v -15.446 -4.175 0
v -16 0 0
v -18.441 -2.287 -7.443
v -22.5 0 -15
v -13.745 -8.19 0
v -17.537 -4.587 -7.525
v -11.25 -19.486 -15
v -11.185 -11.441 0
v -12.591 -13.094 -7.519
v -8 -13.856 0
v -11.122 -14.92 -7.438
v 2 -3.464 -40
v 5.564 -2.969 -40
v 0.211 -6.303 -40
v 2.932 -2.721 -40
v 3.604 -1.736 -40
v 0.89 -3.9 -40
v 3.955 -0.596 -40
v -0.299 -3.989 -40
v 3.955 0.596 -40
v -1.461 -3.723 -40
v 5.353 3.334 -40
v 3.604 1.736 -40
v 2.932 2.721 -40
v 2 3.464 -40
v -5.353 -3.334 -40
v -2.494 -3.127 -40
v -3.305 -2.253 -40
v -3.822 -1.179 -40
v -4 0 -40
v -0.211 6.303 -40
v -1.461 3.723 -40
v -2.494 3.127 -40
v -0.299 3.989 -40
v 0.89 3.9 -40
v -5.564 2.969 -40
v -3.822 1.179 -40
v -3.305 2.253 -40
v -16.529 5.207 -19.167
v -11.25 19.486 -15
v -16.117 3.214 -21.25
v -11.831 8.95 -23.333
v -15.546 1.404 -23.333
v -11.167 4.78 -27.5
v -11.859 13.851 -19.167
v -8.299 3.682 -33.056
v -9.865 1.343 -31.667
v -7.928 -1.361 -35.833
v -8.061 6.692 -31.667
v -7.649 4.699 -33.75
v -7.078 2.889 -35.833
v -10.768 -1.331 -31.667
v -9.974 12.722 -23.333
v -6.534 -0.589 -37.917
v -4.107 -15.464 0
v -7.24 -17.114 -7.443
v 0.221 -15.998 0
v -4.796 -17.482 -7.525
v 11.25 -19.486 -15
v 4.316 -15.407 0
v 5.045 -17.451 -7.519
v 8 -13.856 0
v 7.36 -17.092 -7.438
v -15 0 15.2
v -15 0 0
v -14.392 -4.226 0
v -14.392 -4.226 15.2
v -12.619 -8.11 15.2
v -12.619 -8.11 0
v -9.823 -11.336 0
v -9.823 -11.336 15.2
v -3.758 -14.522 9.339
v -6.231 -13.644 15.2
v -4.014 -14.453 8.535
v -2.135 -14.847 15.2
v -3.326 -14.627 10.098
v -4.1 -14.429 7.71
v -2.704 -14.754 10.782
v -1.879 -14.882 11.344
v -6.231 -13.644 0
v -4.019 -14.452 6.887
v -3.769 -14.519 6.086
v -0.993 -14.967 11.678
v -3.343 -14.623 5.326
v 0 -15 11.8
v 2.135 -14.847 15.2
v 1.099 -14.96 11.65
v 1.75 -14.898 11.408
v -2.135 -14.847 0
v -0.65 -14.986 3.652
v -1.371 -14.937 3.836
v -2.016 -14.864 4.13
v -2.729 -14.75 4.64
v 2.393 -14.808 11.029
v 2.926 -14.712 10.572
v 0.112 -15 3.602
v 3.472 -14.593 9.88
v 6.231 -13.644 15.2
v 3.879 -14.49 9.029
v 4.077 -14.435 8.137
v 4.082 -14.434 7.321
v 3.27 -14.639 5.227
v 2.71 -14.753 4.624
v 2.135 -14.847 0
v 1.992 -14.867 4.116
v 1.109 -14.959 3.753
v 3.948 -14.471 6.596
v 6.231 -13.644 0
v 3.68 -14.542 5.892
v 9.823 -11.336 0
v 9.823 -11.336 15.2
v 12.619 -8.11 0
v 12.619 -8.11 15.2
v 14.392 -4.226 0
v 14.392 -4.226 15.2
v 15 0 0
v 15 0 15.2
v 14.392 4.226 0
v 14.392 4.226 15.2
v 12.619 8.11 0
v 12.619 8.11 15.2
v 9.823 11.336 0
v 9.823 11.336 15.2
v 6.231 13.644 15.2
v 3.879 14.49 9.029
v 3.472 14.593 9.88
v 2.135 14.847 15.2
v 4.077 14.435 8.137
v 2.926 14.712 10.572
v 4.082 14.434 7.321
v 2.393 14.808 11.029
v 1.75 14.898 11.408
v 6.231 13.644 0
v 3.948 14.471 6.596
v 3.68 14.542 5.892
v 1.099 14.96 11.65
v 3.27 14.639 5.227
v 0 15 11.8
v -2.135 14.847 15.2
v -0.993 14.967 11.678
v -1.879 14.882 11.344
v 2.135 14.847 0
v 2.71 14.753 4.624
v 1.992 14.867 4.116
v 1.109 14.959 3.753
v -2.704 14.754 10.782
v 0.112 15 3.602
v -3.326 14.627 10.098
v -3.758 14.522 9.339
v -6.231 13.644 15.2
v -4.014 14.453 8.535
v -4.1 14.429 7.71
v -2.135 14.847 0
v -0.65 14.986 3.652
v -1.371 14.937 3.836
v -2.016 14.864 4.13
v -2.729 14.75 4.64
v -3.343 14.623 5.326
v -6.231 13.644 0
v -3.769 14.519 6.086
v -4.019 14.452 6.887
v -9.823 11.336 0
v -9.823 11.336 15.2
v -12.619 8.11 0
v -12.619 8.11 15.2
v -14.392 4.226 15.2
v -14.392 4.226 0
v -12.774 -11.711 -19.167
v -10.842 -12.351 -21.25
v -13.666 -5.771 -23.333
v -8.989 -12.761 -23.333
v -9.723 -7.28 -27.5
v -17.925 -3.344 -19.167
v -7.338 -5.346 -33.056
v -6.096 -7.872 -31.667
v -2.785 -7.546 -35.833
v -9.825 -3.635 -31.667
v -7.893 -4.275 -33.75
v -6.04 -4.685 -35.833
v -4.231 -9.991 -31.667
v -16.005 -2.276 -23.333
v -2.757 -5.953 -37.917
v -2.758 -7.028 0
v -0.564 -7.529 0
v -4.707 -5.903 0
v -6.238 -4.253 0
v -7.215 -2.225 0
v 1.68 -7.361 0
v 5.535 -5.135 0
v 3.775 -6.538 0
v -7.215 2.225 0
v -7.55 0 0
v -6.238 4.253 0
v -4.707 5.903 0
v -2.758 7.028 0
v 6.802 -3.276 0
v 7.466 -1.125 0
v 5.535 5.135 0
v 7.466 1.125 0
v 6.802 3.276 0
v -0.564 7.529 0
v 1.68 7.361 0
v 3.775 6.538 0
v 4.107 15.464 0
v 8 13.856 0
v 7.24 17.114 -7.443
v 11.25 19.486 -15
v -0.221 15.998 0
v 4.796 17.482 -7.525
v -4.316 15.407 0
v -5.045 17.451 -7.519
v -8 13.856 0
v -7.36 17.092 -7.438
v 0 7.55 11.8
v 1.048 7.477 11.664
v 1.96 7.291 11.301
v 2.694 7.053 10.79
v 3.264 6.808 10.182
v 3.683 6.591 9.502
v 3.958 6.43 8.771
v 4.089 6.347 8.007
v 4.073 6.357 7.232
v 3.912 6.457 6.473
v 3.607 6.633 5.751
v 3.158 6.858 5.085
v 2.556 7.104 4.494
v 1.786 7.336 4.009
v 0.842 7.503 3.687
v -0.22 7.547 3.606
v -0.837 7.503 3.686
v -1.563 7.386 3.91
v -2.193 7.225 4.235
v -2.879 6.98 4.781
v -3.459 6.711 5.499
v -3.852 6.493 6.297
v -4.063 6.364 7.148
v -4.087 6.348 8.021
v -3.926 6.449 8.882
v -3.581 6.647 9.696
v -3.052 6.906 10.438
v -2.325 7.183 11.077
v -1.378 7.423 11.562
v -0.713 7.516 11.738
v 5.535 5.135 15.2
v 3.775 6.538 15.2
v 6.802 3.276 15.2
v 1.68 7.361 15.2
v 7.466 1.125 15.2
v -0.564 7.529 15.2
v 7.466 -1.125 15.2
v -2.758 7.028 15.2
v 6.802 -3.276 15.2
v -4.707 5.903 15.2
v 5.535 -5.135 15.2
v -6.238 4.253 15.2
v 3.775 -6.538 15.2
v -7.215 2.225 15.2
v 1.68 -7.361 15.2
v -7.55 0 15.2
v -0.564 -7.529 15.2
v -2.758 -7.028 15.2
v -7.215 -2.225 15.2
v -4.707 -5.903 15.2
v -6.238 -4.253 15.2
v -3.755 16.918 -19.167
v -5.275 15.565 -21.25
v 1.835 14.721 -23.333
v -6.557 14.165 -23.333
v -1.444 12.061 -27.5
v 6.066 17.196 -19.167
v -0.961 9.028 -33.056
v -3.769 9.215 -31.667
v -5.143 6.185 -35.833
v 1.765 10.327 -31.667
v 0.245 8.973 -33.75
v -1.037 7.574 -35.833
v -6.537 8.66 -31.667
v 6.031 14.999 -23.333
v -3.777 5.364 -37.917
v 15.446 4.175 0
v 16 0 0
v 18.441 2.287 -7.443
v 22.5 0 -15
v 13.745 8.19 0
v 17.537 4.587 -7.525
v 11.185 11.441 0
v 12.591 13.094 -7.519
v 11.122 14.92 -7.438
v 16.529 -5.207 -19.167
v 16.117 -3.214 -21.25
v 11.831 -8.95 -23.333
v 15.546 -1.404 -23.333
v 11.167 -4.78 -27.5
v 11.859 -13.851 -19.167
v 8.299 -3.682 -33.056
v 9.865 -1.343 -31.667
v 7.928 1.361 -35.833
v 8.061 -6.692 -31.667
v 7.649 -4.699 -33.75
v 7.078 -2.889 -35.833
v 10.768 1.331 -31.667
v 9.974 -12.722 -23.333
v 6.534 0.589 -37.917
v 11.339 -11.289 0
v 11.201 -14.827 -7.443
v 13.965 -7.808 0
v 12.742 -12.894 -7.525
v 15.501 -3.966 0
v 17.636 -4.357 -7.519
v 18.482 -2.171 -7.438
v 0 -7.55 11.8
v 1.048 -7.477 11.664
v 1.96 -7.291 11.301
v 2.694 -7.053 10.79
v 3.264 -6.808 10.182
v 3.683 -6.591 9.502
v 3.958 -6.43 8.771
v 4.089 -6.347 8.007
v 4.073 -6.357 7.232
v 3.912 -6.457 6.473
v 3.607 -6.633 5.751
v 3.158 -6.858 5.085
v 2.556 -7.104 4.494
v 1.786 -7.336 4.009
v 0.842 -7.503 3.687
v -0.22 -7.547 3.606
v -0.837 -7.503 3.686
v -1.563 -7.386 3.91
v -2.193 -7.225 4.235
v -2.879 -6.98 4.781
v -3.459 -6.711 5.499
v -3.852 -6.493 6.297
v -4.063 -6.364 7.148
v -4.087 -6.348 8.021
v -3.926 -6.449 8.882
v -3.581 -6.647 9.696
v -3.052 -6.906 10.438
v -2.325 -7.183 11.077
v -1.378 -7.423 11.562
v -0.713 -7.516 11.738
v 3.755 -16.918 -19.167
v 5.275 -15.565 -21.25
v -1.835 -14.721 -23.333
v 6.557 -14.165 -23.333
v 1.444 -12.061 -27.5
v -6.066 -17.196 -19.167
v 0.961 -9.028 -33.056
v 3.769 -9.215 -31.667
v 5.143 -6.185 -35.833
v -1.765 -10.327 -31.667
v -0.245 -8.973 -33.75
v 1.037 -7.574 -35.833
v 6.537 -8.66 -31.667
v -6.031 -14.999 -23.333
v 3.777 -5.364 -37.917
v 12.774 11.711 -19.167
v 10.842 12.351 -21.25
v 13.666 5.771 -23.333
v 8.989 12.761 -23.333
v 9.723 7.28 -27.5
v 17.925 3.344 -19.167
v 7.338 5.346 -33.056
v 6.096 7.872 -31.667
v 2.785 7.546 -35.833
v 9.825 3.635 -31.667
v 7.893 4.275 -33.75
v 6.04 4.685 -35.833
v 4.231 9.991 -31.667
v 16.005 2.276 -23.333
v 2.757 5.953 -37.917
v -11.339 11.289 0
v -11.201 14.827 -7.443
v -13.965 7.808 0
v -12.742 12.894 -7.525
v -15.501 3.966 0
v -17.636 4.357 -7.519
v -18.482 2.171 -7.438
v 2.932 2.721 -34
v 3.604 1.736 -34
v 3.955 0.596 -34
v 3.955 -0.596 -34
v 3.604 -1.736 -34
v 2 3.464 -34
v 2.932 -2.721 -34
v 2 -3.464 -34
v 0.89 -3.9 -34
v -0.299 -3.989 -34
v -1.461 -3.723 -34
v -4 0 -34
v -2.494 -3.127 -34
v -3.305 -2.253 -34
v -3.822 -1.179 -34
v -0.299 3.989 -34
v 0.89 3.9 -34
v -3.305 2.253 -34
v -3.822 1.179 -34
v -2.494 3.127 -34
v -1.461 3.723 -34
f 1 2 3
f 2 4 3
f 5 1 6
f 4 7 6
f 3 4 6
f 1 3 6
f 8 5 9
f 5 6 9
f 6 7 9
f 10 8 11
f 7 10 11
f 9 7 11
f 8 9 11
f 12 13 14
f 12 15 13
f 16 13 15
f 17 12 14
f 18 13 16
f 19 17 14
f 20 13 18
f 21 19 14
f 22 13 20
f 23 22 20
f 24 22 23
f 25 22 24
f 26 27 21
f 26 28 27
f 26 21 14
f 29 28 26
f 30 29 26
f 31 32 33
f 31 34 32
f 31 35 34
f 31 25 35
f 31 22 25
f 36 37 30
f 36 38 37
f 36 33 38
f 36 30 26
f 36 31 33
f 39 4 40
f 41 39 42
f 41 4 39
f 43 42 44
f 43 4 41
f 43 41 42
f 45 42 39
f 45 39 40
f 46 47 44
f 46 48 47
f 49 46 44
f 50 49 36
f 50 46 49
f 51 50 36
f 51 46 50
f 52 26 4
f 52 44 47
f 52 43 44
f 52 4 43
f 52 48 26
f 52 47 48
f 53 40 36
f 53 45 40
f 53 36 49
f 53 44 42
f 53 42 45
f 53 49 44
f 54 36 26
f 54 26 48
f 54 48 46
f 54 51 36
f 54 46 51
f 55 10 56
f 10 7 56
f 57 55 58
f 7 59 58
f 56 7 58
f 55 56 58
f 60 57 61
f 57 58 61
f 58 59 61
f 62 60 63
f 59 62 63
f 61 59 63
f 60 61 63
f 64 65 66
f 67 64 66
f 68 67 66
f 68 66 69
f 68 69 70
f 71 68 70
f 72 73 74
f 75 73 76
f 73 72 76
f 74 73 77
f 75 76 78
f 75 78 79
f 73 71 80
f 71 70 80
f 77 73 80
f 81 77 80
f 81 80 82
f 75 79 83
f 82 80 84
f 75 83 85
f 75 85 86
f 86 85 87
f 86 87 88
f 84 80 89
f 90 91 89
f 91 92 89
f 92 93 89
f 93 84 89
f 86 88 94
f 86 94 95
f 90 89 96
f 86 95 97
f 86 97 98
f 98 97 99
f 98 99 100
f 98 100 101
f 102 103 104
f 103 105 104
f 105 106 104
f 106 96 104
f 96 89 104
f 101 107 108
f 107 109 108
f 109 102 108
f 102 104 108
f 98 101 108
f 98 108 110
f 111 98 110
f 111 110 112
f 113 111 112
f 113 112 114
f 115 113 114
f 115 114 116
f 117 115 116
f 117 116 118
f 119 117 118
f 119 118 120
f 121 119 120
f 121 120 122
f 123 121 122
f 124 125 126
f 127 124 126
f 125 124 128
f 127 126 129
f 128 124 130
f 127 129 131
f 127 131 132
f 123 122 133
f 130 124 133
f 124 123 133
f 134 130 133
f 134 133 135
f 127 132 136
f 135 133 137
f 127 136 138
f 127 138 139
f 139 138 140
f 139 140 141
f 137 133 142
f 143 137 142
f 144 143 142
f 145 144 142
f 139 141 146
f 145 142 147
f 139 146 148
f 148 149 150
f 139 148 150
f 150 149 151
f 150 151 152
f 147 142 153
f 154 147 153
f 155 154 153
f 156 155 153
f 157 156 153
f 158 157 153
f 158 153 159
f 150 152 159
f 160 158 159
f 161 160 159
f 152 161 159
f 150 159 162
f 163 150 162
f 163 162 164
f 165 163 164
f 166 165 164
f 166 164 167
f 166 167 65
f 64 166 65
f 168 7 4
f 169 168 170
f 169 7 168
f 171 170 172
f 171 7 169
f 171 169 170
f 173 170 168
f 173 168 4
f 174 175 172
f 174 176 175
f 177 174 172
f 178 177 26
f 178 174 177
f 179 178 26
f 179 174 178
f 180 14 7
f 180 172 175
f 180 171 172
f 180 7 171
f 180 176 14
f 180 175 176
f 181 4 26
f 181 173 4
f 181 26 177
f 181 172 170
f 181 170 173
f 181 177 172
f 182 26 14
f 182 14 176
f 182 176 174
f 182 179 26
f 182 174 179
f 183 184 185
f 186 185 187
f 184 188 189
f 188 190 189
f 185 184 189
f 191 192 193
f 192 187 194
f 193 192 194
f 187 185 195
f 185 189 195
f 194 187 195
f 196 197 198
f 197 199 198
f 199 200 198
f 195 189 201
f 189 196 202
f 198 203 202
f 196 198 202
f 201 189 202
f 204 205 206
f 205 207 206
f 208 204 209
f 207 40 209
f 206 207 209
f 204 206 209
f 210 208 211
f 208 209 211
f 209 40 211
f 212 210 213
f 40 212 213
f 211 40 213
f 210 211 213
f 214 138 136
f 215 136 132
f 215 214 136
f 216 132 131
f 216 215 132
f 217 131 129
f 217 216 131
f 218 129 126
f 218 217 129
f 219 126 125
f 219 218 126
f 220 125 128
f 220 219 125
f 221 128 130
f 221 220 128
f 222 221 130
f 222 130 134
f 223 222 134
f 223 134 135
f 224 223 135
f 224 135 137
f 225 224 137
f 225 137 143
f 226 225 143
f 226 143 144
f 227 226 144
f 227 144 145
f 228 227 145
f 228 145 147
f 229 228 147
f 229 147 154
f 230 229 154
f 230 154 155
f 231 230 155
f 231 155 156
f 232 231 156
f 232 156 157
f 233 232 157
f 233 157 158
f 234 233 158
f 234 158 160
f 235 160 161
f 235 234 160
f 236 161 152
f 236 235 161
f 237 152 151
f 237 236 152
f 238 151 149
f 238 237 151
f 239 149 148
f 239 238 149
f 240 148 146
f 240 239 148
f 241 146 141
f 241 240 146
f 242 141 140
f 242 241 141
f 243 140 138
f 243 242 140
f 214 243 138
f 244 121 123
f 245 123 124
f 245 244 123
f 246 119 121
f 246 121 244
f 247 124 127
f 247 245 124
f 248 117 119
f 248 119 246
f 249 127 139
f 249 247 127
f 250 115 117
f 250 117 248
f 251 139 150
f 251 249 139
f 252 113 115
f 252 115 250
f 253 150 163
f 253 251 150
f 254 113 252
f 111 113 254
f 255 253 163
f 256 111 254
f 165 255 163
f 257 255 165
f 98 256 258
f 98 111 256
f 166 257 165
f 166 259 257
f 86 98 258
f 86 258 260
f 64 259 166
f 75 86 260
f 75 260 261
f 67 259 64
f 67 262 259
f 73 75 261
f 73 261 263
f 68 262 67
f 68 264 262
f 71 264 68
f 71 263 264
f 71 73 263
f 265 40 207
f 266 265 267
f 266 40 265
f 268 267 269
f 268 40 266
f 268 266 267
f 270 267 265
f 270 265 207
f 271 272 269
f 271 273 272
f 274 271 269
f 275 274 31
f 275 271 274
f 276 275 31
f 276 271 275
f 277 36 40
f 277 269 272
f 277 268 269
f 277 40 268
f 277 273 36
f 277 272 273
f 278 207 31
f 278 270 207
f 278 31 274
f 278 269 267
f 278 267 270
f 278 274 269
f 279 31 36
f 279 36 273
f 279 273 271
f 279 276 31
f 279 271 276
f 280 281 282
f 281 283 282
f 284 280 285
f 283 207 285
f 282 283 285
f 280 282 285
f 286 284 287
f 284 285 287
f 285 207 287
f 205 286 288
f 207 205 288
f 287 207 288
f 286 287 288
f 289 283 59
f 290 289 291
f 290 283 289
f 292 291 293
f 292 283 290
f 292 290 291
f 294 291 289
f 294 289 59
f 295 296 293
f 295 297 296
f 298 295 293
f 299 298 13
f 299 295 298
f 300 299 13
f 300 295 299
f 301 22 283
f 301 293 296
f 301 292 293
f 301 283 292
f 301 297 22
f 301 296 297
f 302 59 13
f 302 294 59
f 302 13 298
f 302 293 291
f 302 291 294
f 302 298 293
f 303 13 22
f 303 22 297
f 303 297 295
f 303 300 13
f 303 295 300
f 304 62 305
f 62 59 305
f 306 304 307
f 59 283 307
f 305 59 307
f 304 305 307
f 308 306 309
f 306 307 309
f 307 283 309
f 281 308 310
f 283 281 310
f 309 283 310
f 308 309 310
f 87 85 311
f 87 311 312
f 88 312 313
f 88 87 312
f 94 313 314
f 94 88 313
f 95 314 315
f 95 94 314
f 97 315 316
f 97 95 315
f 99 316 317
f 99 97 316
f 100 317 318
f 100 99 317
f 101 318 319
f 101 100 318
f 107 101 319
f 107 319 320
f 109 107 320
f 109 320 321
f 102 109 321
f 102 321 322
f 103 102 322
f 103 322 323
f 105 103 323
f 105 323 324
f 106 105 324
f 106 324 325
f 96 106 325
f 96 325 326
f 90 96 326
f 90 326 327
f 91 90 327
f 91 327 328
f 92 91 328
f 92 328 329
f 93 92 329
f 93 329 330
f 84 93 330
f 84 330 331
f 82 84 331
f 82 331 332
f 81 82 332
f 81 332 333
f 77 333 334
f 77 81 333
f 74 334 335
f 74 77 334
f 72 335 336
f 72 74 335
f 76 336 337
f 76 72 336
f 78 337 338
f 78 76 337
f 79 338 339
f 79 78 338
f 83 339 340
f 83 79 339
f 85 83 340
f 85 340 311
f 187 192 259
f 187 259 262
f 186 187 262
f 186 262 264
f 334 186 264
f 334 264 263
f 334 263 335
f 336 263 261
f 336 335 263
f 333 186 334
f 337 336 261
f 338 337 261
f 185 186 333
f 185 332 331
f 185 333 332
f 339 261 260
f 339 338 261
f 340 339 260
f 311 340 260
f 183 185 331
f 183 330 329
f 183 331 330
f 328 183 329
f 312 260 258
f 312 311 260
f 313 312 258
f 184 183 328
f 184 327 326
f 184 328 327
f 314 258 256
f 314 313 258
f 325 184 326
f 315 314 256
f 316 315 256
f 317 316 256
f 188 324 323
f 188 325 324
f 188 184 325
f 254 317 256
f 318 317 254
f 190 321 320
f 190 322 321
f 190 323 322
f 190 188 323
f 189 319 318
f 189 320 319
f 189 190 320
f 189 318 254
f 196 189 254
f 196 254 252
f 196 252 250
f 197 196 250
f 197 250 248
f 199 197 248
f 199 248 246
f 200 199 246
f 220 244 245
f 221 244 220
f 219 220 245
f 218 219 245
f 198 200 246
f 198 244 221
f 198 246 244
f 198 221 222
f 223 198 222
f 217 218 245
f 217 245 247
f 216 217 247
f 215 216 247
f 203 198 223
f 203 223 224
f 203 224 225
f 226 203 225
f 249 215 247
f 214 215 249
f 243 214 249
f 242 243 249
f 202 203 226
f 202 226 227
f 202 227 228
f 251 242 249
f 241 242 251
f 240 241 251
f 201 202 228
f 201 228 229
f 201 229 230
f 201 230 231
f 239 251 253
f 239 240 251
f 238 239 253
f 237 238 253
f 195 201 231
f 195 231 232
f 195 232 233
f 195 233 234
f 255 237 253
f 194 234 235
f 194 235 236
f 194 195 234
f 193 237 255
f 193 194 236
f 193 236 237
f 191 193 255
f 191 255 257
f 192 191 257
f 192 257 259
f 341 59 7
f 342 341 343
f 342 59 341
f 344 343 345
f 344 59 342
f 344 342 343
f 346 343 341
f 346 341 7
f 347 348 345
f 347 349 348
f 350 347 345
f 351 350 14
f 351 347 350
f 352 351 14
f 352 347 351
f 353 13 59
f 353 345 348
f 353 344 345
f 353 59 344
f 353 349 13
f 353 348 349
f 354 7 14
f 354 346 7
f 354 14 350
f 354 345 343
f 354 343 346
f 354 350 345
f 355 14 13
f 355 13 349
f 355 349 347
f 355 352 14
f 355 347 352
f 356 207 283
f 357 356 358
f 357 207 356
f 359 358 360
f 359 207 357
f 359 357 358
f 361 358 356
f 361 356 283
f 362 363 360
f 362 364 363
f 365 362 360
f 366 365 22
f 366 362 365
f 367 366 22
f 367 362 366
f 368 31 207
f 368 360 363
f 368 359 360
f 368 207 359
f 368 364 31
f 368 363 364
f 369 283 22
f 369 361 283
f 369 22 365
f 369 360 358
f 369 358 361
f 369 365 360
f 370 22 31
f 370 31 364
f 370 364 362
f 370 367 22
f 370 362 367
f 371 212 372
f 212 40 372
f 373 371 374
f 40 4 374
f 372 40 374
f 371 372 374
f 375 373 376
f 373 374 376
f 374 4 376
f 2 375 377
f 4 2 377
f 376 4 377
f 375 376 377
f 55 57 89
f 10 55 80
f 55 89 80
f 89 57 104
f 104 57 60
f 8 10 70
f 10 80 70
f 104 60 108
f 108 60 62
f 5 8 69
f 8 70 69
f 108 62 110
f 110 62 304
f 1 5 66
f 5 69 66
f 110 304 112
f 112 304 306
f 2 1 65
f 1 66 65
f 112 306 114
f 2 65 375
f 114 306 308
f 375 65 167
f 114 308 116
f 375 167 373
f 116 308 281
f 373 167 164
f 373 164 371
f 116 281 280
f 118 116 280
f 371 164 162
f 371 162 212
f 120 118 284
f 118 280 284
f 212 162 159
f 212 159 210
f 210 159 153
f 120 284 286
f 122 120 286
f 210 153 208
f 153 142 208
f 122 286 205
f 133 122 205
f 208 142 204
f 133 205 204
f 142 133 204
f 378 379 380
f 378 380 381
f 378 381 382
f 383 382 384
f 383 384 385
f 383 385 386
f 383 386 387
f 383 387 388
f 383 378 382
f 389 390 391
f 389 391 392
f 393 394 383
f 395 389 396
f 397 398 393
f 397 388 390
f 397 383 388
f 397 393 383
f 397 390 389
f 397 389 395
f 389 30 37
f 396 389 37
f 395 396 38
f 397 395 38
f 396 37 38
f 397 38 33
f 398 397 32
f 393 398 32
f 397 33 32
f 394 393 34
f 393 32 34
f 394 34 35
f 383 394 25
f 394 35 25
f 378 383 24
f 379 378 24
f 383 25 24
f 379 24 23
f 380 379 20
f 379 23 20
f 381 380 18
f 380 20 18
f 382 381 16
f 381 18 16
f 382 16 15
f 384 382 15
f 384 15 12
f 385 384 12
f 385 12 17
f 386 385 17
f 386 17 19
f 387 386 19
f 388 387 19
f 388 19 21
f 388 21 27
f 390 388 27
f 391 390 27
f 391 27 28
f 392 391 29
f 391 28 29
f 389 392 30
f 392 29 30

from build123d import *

# Parameters (mm, degrees)
SKETCH_1_R               = 15
SKETCH_1_R_2             = 7.55
EXTRUDE_1_DEPTH          = 15.2
CUT_EXTRUDE_1_DEPTH      = 27.096743092
CUT_EXTRUDE_1_DEPTH_BACK = 27.096743092
SKETCH_2_R               = 4.1
SKETCH_8_R               = 4
CUT_EXTRUDE_2_DEPTH      = 6


with BuildPart() as part:
    # 스케치1 → 보스-돌출1 (new body)
    with BuildSketch(Plane.XY):
        with Locations(Location((0, 0, 0), (0, 0, 180))):
            Circle(SKETCH_1_R)
        with Locations(Location((0, 0, 0), (0, 0, 180))):
            Circle(SKETCH_1_R_2, mode=Mode.SUBTRACT)
    extrude(amount=EXTRUDE_1_DEPTH)

    # 스케치2 → 컷-돌출1 (cut, two sides: drawn at the far end of the back side and taken through both)
    with BuildSketch(Plane(origin=(0, 0, 0), x_dir=(1, 0, 0), z_dir=(0, 1, 0)).offset(-CUT_EXTRUDE_1_DEPTH_BACK)):
        with Locations(Location((0, -7.7, 0), (0, 0, 270))):
            Circle(SKETCH_2_R)
    extrude(amount=CUT_EXTRUDE_1_DEPTH + CUT_EXTRUDE_1_DEPTH_BACK, mode=Mode.SUBTRACT)

    # 스케치3 for 로프트4 → 로프트4 section 0
    with BuildSketch(Plane.XY):
        with BuildLine():
            # circular arc as an exact rational Bezier (weights 1, cos(half-angle), 1)
            Bezier((8, -13.856406461), (16.000000001, -9.237604308), (16, 0), weights=[1, 0.866025404, 1])
            Bezier((16, 0), (16.000000001, 9.237604308), (8, 13.856406461), weights=[1, 0.866025404, 1])
            Bezier((8, 13.856406461), (0, 18.475208613), (-8, 13.856406461), weights=[1, 0.866025404, 1])
            Bezier((-8, 13.856406461), (-16.000000001, 9.237604308), (-16, 0), weights=[1, 0.866025404, 1])
            Bezier((-16, 0), (-16.000000001, -9.237604308), (-8, -13.856406461), weights=[1, 0.866025404, 1])
            Bezier((-8, -13.856406461), (0, -18.475208613), (8, -13.856406461), weights=[1, 0.866025404, 1])
        make_face()
    # 스케치4 → 로프트4 section 1
    with BuildSketch(Plane.XY.offset(-15)):
        with BuildLine():
            Line((11.25, -19.485571585), (22.5, 0))
            Line((22.5, 0), (11.25, 19.485571585))
            Line((11.25, 19.485571585), (-11.25, 19.485571585))
            Line((-11.25, 19.485571585), (-22.5, 0))
            Line((-22.5, 0), (-11.25, -19.485571585))
            Line((-11.25, -19.485571585), (11.25, -19.485571585))
        make_face()
    loft()

    # 로프트5: read off the stored shape, not the designer's step
    # 로프트5: loft between two sections, ruled curve by curve
    loft_5_from = [
        Edge.make_bspline([(22.5, 0, -15), (20.625, -3.247595264, -15), (18.75, -6.495190528, -15), (15, -12.990381057, -15), (13.125, -16.237976321, -15), (11.25, -19.485571585, -15)], [0, 0, 0, 0, 0.5, 0.5, 1, 1, 1, 1], 3),
        Edge.make_bspline([(11.25, -19.485571585, -15), (7.5, -19.485571585, -15), (3.75, -19.485571585, -15), (-3.75, -19.485571585, -15), (-7.5, -19.485571585, -15), (-11.25, -19.485571585, -15)], [0, 0, 0, 0, 0.5, 0.5, 1, 1, 1, 1], 3),
        Edge.make_bspline([(11.25, 19.485571585, -15), (13.125, 16.237976321, -15), (15, 12.990381057, -15), (18.75, 6.495190528, -15), (20.625, 3.247595264, -15), (22.5, 0, -15)], [0, 0, 0, 0, 0.5, 0.5, 1, 1, 1, 1], 3),
        Edge.make_bspline([(-11.25, -19.485571585, -15), (-13.125, -16.237976321, -15), (-15, -12.990381057, -15), (-18.75, -6.495190528, -15), (-20.625, -3.247595264, -15), (-22.5, 0, -15)], [0, 0, 0, 0, 0.5, 0.5, 1, 1, 1, 1], 3),
        Edge.make_bspline([(-22.5, 0, -15), (-20.625, 3.247595264, -15), (-18.75, 6.495190528, -15), (-15, 12.990381057, -15), (-13.125, 16.237976321, -15), (-11.25, 19.485571585, -15)], [0, 0, 0, 0, 0.5, 0.5, 1, 1, 1, 1], 3),
        Edge.make_bspline([(-11.25, 19.485571585, -15), (-7.5, 19.485571585, -15), (-3.75, 19.485571585, -15), (3.75, 19.485571585, -15), (7.5, 19.485571585, -15), (11.25, 19.485571585, -15)], [0, 0, 0, 0, 0.5, 0.5, 1, 1, 1, 1], 3),
    ]
    loft_5_to = [
        Edge.make_bspline([(5.352991825, 3.333635602, -40), (5.388078026, 2.283194817, -40), (5.423164227, 1.232754033, -40), (5.493336629, -0.868127536, -40), (5.52842283, -1.918568321, -40), (5.563509031, -2.969009106, -40)], [0, 0, 0, 0, 0.5, 0.5, 1, 1, 1, 1], 3),
        Edge.make_bspline([(5.563509031, -2.969009106, -40), (4.671343726, -3.524615039, -40), (3.779178422, -4.080220973, -40), (1.994847814, -5.19143284, -40), (1.10268251, -5.747038774, -40), (0.210517206, -6.302644707, -40)], [0, 0, 0, 0, 0.5, 0.5, 1, 1, 1, 1], 3),
        Edge.make_bspline([(-0.210517206, 6.302644707, -40), (0.716734299, 5.807809856, -40), (1.643985804, 5.312975006, -40), (3.498488815, 4.323305304, -40), (4.42574032, 3.828470453, -40), (5.352991825, 3.333635602, -40)], [0, 0, 0, 0, 0.5, 0.5, 1, 1, 1, 1], 3),
        Edge.make_bspline([(0.210517206, -6.302644707, -40), (-0.716734299, -5.807809856, -40), (-1.643985804, -5.312975006, -40), (-3.498488815, -4.323305304, -40), (-4.42574032, -3.828470453, -40), (-5.352991825, -3.333635602, -40)], [0, 0, 0, 0, 0.5, 0.5, 1, 1, 1, 1], 3),
        Edge.make_bspline([(-5.352991825, -3.333635602, -40), (-5.388078026, -2.283194817, -40), (-5.423164227, -1.232754033, -40), (-5.493336629, 0.868127536, -40), (-5.52842283, 1.918568321, -40), (-5.563509031, 2.969009106, -40)], [0, 0, 0, 0, 0.5, 0.5, 1, 1, 1, 1], 3),
        Edge.make_bspline([(-5.563509031, 2.969009106, -40), (-4.671343726, 3.524615039, -40), (-3.779178422, 4.080220973, -40), (-1.994847814, 5.19143284, -40), (-1.10268251, 5.747038774, -40), (-0.210517206, 6.302644707, -40)], [0, 0, 0, 0, 0.5, 0.5, 1, 1, 1, 1], 3),
    ]
    loft_5 = Solid(Shell([*[Face.make_surface_from_curves(loft_5_from[k], loft_5_to[k]) for k in range(6)], Face(Wire(loft_5_from)), Face(Wire(loft_5_to))]))
    add(loft_5)

    # 스케치8 → 컷-돌출2 (cut)
    with BuildSketch(Plane(origin=(0, 0, -40), x_dir=(-1, 0, 0), z_dir=(0, 0, -1))):
        Circle(SKETCH_8_R)
    extrude(amount=-CUT_EXTRUDE_2_DEPTH, mode=Mode.SUBTRACT)


solid = part.part
